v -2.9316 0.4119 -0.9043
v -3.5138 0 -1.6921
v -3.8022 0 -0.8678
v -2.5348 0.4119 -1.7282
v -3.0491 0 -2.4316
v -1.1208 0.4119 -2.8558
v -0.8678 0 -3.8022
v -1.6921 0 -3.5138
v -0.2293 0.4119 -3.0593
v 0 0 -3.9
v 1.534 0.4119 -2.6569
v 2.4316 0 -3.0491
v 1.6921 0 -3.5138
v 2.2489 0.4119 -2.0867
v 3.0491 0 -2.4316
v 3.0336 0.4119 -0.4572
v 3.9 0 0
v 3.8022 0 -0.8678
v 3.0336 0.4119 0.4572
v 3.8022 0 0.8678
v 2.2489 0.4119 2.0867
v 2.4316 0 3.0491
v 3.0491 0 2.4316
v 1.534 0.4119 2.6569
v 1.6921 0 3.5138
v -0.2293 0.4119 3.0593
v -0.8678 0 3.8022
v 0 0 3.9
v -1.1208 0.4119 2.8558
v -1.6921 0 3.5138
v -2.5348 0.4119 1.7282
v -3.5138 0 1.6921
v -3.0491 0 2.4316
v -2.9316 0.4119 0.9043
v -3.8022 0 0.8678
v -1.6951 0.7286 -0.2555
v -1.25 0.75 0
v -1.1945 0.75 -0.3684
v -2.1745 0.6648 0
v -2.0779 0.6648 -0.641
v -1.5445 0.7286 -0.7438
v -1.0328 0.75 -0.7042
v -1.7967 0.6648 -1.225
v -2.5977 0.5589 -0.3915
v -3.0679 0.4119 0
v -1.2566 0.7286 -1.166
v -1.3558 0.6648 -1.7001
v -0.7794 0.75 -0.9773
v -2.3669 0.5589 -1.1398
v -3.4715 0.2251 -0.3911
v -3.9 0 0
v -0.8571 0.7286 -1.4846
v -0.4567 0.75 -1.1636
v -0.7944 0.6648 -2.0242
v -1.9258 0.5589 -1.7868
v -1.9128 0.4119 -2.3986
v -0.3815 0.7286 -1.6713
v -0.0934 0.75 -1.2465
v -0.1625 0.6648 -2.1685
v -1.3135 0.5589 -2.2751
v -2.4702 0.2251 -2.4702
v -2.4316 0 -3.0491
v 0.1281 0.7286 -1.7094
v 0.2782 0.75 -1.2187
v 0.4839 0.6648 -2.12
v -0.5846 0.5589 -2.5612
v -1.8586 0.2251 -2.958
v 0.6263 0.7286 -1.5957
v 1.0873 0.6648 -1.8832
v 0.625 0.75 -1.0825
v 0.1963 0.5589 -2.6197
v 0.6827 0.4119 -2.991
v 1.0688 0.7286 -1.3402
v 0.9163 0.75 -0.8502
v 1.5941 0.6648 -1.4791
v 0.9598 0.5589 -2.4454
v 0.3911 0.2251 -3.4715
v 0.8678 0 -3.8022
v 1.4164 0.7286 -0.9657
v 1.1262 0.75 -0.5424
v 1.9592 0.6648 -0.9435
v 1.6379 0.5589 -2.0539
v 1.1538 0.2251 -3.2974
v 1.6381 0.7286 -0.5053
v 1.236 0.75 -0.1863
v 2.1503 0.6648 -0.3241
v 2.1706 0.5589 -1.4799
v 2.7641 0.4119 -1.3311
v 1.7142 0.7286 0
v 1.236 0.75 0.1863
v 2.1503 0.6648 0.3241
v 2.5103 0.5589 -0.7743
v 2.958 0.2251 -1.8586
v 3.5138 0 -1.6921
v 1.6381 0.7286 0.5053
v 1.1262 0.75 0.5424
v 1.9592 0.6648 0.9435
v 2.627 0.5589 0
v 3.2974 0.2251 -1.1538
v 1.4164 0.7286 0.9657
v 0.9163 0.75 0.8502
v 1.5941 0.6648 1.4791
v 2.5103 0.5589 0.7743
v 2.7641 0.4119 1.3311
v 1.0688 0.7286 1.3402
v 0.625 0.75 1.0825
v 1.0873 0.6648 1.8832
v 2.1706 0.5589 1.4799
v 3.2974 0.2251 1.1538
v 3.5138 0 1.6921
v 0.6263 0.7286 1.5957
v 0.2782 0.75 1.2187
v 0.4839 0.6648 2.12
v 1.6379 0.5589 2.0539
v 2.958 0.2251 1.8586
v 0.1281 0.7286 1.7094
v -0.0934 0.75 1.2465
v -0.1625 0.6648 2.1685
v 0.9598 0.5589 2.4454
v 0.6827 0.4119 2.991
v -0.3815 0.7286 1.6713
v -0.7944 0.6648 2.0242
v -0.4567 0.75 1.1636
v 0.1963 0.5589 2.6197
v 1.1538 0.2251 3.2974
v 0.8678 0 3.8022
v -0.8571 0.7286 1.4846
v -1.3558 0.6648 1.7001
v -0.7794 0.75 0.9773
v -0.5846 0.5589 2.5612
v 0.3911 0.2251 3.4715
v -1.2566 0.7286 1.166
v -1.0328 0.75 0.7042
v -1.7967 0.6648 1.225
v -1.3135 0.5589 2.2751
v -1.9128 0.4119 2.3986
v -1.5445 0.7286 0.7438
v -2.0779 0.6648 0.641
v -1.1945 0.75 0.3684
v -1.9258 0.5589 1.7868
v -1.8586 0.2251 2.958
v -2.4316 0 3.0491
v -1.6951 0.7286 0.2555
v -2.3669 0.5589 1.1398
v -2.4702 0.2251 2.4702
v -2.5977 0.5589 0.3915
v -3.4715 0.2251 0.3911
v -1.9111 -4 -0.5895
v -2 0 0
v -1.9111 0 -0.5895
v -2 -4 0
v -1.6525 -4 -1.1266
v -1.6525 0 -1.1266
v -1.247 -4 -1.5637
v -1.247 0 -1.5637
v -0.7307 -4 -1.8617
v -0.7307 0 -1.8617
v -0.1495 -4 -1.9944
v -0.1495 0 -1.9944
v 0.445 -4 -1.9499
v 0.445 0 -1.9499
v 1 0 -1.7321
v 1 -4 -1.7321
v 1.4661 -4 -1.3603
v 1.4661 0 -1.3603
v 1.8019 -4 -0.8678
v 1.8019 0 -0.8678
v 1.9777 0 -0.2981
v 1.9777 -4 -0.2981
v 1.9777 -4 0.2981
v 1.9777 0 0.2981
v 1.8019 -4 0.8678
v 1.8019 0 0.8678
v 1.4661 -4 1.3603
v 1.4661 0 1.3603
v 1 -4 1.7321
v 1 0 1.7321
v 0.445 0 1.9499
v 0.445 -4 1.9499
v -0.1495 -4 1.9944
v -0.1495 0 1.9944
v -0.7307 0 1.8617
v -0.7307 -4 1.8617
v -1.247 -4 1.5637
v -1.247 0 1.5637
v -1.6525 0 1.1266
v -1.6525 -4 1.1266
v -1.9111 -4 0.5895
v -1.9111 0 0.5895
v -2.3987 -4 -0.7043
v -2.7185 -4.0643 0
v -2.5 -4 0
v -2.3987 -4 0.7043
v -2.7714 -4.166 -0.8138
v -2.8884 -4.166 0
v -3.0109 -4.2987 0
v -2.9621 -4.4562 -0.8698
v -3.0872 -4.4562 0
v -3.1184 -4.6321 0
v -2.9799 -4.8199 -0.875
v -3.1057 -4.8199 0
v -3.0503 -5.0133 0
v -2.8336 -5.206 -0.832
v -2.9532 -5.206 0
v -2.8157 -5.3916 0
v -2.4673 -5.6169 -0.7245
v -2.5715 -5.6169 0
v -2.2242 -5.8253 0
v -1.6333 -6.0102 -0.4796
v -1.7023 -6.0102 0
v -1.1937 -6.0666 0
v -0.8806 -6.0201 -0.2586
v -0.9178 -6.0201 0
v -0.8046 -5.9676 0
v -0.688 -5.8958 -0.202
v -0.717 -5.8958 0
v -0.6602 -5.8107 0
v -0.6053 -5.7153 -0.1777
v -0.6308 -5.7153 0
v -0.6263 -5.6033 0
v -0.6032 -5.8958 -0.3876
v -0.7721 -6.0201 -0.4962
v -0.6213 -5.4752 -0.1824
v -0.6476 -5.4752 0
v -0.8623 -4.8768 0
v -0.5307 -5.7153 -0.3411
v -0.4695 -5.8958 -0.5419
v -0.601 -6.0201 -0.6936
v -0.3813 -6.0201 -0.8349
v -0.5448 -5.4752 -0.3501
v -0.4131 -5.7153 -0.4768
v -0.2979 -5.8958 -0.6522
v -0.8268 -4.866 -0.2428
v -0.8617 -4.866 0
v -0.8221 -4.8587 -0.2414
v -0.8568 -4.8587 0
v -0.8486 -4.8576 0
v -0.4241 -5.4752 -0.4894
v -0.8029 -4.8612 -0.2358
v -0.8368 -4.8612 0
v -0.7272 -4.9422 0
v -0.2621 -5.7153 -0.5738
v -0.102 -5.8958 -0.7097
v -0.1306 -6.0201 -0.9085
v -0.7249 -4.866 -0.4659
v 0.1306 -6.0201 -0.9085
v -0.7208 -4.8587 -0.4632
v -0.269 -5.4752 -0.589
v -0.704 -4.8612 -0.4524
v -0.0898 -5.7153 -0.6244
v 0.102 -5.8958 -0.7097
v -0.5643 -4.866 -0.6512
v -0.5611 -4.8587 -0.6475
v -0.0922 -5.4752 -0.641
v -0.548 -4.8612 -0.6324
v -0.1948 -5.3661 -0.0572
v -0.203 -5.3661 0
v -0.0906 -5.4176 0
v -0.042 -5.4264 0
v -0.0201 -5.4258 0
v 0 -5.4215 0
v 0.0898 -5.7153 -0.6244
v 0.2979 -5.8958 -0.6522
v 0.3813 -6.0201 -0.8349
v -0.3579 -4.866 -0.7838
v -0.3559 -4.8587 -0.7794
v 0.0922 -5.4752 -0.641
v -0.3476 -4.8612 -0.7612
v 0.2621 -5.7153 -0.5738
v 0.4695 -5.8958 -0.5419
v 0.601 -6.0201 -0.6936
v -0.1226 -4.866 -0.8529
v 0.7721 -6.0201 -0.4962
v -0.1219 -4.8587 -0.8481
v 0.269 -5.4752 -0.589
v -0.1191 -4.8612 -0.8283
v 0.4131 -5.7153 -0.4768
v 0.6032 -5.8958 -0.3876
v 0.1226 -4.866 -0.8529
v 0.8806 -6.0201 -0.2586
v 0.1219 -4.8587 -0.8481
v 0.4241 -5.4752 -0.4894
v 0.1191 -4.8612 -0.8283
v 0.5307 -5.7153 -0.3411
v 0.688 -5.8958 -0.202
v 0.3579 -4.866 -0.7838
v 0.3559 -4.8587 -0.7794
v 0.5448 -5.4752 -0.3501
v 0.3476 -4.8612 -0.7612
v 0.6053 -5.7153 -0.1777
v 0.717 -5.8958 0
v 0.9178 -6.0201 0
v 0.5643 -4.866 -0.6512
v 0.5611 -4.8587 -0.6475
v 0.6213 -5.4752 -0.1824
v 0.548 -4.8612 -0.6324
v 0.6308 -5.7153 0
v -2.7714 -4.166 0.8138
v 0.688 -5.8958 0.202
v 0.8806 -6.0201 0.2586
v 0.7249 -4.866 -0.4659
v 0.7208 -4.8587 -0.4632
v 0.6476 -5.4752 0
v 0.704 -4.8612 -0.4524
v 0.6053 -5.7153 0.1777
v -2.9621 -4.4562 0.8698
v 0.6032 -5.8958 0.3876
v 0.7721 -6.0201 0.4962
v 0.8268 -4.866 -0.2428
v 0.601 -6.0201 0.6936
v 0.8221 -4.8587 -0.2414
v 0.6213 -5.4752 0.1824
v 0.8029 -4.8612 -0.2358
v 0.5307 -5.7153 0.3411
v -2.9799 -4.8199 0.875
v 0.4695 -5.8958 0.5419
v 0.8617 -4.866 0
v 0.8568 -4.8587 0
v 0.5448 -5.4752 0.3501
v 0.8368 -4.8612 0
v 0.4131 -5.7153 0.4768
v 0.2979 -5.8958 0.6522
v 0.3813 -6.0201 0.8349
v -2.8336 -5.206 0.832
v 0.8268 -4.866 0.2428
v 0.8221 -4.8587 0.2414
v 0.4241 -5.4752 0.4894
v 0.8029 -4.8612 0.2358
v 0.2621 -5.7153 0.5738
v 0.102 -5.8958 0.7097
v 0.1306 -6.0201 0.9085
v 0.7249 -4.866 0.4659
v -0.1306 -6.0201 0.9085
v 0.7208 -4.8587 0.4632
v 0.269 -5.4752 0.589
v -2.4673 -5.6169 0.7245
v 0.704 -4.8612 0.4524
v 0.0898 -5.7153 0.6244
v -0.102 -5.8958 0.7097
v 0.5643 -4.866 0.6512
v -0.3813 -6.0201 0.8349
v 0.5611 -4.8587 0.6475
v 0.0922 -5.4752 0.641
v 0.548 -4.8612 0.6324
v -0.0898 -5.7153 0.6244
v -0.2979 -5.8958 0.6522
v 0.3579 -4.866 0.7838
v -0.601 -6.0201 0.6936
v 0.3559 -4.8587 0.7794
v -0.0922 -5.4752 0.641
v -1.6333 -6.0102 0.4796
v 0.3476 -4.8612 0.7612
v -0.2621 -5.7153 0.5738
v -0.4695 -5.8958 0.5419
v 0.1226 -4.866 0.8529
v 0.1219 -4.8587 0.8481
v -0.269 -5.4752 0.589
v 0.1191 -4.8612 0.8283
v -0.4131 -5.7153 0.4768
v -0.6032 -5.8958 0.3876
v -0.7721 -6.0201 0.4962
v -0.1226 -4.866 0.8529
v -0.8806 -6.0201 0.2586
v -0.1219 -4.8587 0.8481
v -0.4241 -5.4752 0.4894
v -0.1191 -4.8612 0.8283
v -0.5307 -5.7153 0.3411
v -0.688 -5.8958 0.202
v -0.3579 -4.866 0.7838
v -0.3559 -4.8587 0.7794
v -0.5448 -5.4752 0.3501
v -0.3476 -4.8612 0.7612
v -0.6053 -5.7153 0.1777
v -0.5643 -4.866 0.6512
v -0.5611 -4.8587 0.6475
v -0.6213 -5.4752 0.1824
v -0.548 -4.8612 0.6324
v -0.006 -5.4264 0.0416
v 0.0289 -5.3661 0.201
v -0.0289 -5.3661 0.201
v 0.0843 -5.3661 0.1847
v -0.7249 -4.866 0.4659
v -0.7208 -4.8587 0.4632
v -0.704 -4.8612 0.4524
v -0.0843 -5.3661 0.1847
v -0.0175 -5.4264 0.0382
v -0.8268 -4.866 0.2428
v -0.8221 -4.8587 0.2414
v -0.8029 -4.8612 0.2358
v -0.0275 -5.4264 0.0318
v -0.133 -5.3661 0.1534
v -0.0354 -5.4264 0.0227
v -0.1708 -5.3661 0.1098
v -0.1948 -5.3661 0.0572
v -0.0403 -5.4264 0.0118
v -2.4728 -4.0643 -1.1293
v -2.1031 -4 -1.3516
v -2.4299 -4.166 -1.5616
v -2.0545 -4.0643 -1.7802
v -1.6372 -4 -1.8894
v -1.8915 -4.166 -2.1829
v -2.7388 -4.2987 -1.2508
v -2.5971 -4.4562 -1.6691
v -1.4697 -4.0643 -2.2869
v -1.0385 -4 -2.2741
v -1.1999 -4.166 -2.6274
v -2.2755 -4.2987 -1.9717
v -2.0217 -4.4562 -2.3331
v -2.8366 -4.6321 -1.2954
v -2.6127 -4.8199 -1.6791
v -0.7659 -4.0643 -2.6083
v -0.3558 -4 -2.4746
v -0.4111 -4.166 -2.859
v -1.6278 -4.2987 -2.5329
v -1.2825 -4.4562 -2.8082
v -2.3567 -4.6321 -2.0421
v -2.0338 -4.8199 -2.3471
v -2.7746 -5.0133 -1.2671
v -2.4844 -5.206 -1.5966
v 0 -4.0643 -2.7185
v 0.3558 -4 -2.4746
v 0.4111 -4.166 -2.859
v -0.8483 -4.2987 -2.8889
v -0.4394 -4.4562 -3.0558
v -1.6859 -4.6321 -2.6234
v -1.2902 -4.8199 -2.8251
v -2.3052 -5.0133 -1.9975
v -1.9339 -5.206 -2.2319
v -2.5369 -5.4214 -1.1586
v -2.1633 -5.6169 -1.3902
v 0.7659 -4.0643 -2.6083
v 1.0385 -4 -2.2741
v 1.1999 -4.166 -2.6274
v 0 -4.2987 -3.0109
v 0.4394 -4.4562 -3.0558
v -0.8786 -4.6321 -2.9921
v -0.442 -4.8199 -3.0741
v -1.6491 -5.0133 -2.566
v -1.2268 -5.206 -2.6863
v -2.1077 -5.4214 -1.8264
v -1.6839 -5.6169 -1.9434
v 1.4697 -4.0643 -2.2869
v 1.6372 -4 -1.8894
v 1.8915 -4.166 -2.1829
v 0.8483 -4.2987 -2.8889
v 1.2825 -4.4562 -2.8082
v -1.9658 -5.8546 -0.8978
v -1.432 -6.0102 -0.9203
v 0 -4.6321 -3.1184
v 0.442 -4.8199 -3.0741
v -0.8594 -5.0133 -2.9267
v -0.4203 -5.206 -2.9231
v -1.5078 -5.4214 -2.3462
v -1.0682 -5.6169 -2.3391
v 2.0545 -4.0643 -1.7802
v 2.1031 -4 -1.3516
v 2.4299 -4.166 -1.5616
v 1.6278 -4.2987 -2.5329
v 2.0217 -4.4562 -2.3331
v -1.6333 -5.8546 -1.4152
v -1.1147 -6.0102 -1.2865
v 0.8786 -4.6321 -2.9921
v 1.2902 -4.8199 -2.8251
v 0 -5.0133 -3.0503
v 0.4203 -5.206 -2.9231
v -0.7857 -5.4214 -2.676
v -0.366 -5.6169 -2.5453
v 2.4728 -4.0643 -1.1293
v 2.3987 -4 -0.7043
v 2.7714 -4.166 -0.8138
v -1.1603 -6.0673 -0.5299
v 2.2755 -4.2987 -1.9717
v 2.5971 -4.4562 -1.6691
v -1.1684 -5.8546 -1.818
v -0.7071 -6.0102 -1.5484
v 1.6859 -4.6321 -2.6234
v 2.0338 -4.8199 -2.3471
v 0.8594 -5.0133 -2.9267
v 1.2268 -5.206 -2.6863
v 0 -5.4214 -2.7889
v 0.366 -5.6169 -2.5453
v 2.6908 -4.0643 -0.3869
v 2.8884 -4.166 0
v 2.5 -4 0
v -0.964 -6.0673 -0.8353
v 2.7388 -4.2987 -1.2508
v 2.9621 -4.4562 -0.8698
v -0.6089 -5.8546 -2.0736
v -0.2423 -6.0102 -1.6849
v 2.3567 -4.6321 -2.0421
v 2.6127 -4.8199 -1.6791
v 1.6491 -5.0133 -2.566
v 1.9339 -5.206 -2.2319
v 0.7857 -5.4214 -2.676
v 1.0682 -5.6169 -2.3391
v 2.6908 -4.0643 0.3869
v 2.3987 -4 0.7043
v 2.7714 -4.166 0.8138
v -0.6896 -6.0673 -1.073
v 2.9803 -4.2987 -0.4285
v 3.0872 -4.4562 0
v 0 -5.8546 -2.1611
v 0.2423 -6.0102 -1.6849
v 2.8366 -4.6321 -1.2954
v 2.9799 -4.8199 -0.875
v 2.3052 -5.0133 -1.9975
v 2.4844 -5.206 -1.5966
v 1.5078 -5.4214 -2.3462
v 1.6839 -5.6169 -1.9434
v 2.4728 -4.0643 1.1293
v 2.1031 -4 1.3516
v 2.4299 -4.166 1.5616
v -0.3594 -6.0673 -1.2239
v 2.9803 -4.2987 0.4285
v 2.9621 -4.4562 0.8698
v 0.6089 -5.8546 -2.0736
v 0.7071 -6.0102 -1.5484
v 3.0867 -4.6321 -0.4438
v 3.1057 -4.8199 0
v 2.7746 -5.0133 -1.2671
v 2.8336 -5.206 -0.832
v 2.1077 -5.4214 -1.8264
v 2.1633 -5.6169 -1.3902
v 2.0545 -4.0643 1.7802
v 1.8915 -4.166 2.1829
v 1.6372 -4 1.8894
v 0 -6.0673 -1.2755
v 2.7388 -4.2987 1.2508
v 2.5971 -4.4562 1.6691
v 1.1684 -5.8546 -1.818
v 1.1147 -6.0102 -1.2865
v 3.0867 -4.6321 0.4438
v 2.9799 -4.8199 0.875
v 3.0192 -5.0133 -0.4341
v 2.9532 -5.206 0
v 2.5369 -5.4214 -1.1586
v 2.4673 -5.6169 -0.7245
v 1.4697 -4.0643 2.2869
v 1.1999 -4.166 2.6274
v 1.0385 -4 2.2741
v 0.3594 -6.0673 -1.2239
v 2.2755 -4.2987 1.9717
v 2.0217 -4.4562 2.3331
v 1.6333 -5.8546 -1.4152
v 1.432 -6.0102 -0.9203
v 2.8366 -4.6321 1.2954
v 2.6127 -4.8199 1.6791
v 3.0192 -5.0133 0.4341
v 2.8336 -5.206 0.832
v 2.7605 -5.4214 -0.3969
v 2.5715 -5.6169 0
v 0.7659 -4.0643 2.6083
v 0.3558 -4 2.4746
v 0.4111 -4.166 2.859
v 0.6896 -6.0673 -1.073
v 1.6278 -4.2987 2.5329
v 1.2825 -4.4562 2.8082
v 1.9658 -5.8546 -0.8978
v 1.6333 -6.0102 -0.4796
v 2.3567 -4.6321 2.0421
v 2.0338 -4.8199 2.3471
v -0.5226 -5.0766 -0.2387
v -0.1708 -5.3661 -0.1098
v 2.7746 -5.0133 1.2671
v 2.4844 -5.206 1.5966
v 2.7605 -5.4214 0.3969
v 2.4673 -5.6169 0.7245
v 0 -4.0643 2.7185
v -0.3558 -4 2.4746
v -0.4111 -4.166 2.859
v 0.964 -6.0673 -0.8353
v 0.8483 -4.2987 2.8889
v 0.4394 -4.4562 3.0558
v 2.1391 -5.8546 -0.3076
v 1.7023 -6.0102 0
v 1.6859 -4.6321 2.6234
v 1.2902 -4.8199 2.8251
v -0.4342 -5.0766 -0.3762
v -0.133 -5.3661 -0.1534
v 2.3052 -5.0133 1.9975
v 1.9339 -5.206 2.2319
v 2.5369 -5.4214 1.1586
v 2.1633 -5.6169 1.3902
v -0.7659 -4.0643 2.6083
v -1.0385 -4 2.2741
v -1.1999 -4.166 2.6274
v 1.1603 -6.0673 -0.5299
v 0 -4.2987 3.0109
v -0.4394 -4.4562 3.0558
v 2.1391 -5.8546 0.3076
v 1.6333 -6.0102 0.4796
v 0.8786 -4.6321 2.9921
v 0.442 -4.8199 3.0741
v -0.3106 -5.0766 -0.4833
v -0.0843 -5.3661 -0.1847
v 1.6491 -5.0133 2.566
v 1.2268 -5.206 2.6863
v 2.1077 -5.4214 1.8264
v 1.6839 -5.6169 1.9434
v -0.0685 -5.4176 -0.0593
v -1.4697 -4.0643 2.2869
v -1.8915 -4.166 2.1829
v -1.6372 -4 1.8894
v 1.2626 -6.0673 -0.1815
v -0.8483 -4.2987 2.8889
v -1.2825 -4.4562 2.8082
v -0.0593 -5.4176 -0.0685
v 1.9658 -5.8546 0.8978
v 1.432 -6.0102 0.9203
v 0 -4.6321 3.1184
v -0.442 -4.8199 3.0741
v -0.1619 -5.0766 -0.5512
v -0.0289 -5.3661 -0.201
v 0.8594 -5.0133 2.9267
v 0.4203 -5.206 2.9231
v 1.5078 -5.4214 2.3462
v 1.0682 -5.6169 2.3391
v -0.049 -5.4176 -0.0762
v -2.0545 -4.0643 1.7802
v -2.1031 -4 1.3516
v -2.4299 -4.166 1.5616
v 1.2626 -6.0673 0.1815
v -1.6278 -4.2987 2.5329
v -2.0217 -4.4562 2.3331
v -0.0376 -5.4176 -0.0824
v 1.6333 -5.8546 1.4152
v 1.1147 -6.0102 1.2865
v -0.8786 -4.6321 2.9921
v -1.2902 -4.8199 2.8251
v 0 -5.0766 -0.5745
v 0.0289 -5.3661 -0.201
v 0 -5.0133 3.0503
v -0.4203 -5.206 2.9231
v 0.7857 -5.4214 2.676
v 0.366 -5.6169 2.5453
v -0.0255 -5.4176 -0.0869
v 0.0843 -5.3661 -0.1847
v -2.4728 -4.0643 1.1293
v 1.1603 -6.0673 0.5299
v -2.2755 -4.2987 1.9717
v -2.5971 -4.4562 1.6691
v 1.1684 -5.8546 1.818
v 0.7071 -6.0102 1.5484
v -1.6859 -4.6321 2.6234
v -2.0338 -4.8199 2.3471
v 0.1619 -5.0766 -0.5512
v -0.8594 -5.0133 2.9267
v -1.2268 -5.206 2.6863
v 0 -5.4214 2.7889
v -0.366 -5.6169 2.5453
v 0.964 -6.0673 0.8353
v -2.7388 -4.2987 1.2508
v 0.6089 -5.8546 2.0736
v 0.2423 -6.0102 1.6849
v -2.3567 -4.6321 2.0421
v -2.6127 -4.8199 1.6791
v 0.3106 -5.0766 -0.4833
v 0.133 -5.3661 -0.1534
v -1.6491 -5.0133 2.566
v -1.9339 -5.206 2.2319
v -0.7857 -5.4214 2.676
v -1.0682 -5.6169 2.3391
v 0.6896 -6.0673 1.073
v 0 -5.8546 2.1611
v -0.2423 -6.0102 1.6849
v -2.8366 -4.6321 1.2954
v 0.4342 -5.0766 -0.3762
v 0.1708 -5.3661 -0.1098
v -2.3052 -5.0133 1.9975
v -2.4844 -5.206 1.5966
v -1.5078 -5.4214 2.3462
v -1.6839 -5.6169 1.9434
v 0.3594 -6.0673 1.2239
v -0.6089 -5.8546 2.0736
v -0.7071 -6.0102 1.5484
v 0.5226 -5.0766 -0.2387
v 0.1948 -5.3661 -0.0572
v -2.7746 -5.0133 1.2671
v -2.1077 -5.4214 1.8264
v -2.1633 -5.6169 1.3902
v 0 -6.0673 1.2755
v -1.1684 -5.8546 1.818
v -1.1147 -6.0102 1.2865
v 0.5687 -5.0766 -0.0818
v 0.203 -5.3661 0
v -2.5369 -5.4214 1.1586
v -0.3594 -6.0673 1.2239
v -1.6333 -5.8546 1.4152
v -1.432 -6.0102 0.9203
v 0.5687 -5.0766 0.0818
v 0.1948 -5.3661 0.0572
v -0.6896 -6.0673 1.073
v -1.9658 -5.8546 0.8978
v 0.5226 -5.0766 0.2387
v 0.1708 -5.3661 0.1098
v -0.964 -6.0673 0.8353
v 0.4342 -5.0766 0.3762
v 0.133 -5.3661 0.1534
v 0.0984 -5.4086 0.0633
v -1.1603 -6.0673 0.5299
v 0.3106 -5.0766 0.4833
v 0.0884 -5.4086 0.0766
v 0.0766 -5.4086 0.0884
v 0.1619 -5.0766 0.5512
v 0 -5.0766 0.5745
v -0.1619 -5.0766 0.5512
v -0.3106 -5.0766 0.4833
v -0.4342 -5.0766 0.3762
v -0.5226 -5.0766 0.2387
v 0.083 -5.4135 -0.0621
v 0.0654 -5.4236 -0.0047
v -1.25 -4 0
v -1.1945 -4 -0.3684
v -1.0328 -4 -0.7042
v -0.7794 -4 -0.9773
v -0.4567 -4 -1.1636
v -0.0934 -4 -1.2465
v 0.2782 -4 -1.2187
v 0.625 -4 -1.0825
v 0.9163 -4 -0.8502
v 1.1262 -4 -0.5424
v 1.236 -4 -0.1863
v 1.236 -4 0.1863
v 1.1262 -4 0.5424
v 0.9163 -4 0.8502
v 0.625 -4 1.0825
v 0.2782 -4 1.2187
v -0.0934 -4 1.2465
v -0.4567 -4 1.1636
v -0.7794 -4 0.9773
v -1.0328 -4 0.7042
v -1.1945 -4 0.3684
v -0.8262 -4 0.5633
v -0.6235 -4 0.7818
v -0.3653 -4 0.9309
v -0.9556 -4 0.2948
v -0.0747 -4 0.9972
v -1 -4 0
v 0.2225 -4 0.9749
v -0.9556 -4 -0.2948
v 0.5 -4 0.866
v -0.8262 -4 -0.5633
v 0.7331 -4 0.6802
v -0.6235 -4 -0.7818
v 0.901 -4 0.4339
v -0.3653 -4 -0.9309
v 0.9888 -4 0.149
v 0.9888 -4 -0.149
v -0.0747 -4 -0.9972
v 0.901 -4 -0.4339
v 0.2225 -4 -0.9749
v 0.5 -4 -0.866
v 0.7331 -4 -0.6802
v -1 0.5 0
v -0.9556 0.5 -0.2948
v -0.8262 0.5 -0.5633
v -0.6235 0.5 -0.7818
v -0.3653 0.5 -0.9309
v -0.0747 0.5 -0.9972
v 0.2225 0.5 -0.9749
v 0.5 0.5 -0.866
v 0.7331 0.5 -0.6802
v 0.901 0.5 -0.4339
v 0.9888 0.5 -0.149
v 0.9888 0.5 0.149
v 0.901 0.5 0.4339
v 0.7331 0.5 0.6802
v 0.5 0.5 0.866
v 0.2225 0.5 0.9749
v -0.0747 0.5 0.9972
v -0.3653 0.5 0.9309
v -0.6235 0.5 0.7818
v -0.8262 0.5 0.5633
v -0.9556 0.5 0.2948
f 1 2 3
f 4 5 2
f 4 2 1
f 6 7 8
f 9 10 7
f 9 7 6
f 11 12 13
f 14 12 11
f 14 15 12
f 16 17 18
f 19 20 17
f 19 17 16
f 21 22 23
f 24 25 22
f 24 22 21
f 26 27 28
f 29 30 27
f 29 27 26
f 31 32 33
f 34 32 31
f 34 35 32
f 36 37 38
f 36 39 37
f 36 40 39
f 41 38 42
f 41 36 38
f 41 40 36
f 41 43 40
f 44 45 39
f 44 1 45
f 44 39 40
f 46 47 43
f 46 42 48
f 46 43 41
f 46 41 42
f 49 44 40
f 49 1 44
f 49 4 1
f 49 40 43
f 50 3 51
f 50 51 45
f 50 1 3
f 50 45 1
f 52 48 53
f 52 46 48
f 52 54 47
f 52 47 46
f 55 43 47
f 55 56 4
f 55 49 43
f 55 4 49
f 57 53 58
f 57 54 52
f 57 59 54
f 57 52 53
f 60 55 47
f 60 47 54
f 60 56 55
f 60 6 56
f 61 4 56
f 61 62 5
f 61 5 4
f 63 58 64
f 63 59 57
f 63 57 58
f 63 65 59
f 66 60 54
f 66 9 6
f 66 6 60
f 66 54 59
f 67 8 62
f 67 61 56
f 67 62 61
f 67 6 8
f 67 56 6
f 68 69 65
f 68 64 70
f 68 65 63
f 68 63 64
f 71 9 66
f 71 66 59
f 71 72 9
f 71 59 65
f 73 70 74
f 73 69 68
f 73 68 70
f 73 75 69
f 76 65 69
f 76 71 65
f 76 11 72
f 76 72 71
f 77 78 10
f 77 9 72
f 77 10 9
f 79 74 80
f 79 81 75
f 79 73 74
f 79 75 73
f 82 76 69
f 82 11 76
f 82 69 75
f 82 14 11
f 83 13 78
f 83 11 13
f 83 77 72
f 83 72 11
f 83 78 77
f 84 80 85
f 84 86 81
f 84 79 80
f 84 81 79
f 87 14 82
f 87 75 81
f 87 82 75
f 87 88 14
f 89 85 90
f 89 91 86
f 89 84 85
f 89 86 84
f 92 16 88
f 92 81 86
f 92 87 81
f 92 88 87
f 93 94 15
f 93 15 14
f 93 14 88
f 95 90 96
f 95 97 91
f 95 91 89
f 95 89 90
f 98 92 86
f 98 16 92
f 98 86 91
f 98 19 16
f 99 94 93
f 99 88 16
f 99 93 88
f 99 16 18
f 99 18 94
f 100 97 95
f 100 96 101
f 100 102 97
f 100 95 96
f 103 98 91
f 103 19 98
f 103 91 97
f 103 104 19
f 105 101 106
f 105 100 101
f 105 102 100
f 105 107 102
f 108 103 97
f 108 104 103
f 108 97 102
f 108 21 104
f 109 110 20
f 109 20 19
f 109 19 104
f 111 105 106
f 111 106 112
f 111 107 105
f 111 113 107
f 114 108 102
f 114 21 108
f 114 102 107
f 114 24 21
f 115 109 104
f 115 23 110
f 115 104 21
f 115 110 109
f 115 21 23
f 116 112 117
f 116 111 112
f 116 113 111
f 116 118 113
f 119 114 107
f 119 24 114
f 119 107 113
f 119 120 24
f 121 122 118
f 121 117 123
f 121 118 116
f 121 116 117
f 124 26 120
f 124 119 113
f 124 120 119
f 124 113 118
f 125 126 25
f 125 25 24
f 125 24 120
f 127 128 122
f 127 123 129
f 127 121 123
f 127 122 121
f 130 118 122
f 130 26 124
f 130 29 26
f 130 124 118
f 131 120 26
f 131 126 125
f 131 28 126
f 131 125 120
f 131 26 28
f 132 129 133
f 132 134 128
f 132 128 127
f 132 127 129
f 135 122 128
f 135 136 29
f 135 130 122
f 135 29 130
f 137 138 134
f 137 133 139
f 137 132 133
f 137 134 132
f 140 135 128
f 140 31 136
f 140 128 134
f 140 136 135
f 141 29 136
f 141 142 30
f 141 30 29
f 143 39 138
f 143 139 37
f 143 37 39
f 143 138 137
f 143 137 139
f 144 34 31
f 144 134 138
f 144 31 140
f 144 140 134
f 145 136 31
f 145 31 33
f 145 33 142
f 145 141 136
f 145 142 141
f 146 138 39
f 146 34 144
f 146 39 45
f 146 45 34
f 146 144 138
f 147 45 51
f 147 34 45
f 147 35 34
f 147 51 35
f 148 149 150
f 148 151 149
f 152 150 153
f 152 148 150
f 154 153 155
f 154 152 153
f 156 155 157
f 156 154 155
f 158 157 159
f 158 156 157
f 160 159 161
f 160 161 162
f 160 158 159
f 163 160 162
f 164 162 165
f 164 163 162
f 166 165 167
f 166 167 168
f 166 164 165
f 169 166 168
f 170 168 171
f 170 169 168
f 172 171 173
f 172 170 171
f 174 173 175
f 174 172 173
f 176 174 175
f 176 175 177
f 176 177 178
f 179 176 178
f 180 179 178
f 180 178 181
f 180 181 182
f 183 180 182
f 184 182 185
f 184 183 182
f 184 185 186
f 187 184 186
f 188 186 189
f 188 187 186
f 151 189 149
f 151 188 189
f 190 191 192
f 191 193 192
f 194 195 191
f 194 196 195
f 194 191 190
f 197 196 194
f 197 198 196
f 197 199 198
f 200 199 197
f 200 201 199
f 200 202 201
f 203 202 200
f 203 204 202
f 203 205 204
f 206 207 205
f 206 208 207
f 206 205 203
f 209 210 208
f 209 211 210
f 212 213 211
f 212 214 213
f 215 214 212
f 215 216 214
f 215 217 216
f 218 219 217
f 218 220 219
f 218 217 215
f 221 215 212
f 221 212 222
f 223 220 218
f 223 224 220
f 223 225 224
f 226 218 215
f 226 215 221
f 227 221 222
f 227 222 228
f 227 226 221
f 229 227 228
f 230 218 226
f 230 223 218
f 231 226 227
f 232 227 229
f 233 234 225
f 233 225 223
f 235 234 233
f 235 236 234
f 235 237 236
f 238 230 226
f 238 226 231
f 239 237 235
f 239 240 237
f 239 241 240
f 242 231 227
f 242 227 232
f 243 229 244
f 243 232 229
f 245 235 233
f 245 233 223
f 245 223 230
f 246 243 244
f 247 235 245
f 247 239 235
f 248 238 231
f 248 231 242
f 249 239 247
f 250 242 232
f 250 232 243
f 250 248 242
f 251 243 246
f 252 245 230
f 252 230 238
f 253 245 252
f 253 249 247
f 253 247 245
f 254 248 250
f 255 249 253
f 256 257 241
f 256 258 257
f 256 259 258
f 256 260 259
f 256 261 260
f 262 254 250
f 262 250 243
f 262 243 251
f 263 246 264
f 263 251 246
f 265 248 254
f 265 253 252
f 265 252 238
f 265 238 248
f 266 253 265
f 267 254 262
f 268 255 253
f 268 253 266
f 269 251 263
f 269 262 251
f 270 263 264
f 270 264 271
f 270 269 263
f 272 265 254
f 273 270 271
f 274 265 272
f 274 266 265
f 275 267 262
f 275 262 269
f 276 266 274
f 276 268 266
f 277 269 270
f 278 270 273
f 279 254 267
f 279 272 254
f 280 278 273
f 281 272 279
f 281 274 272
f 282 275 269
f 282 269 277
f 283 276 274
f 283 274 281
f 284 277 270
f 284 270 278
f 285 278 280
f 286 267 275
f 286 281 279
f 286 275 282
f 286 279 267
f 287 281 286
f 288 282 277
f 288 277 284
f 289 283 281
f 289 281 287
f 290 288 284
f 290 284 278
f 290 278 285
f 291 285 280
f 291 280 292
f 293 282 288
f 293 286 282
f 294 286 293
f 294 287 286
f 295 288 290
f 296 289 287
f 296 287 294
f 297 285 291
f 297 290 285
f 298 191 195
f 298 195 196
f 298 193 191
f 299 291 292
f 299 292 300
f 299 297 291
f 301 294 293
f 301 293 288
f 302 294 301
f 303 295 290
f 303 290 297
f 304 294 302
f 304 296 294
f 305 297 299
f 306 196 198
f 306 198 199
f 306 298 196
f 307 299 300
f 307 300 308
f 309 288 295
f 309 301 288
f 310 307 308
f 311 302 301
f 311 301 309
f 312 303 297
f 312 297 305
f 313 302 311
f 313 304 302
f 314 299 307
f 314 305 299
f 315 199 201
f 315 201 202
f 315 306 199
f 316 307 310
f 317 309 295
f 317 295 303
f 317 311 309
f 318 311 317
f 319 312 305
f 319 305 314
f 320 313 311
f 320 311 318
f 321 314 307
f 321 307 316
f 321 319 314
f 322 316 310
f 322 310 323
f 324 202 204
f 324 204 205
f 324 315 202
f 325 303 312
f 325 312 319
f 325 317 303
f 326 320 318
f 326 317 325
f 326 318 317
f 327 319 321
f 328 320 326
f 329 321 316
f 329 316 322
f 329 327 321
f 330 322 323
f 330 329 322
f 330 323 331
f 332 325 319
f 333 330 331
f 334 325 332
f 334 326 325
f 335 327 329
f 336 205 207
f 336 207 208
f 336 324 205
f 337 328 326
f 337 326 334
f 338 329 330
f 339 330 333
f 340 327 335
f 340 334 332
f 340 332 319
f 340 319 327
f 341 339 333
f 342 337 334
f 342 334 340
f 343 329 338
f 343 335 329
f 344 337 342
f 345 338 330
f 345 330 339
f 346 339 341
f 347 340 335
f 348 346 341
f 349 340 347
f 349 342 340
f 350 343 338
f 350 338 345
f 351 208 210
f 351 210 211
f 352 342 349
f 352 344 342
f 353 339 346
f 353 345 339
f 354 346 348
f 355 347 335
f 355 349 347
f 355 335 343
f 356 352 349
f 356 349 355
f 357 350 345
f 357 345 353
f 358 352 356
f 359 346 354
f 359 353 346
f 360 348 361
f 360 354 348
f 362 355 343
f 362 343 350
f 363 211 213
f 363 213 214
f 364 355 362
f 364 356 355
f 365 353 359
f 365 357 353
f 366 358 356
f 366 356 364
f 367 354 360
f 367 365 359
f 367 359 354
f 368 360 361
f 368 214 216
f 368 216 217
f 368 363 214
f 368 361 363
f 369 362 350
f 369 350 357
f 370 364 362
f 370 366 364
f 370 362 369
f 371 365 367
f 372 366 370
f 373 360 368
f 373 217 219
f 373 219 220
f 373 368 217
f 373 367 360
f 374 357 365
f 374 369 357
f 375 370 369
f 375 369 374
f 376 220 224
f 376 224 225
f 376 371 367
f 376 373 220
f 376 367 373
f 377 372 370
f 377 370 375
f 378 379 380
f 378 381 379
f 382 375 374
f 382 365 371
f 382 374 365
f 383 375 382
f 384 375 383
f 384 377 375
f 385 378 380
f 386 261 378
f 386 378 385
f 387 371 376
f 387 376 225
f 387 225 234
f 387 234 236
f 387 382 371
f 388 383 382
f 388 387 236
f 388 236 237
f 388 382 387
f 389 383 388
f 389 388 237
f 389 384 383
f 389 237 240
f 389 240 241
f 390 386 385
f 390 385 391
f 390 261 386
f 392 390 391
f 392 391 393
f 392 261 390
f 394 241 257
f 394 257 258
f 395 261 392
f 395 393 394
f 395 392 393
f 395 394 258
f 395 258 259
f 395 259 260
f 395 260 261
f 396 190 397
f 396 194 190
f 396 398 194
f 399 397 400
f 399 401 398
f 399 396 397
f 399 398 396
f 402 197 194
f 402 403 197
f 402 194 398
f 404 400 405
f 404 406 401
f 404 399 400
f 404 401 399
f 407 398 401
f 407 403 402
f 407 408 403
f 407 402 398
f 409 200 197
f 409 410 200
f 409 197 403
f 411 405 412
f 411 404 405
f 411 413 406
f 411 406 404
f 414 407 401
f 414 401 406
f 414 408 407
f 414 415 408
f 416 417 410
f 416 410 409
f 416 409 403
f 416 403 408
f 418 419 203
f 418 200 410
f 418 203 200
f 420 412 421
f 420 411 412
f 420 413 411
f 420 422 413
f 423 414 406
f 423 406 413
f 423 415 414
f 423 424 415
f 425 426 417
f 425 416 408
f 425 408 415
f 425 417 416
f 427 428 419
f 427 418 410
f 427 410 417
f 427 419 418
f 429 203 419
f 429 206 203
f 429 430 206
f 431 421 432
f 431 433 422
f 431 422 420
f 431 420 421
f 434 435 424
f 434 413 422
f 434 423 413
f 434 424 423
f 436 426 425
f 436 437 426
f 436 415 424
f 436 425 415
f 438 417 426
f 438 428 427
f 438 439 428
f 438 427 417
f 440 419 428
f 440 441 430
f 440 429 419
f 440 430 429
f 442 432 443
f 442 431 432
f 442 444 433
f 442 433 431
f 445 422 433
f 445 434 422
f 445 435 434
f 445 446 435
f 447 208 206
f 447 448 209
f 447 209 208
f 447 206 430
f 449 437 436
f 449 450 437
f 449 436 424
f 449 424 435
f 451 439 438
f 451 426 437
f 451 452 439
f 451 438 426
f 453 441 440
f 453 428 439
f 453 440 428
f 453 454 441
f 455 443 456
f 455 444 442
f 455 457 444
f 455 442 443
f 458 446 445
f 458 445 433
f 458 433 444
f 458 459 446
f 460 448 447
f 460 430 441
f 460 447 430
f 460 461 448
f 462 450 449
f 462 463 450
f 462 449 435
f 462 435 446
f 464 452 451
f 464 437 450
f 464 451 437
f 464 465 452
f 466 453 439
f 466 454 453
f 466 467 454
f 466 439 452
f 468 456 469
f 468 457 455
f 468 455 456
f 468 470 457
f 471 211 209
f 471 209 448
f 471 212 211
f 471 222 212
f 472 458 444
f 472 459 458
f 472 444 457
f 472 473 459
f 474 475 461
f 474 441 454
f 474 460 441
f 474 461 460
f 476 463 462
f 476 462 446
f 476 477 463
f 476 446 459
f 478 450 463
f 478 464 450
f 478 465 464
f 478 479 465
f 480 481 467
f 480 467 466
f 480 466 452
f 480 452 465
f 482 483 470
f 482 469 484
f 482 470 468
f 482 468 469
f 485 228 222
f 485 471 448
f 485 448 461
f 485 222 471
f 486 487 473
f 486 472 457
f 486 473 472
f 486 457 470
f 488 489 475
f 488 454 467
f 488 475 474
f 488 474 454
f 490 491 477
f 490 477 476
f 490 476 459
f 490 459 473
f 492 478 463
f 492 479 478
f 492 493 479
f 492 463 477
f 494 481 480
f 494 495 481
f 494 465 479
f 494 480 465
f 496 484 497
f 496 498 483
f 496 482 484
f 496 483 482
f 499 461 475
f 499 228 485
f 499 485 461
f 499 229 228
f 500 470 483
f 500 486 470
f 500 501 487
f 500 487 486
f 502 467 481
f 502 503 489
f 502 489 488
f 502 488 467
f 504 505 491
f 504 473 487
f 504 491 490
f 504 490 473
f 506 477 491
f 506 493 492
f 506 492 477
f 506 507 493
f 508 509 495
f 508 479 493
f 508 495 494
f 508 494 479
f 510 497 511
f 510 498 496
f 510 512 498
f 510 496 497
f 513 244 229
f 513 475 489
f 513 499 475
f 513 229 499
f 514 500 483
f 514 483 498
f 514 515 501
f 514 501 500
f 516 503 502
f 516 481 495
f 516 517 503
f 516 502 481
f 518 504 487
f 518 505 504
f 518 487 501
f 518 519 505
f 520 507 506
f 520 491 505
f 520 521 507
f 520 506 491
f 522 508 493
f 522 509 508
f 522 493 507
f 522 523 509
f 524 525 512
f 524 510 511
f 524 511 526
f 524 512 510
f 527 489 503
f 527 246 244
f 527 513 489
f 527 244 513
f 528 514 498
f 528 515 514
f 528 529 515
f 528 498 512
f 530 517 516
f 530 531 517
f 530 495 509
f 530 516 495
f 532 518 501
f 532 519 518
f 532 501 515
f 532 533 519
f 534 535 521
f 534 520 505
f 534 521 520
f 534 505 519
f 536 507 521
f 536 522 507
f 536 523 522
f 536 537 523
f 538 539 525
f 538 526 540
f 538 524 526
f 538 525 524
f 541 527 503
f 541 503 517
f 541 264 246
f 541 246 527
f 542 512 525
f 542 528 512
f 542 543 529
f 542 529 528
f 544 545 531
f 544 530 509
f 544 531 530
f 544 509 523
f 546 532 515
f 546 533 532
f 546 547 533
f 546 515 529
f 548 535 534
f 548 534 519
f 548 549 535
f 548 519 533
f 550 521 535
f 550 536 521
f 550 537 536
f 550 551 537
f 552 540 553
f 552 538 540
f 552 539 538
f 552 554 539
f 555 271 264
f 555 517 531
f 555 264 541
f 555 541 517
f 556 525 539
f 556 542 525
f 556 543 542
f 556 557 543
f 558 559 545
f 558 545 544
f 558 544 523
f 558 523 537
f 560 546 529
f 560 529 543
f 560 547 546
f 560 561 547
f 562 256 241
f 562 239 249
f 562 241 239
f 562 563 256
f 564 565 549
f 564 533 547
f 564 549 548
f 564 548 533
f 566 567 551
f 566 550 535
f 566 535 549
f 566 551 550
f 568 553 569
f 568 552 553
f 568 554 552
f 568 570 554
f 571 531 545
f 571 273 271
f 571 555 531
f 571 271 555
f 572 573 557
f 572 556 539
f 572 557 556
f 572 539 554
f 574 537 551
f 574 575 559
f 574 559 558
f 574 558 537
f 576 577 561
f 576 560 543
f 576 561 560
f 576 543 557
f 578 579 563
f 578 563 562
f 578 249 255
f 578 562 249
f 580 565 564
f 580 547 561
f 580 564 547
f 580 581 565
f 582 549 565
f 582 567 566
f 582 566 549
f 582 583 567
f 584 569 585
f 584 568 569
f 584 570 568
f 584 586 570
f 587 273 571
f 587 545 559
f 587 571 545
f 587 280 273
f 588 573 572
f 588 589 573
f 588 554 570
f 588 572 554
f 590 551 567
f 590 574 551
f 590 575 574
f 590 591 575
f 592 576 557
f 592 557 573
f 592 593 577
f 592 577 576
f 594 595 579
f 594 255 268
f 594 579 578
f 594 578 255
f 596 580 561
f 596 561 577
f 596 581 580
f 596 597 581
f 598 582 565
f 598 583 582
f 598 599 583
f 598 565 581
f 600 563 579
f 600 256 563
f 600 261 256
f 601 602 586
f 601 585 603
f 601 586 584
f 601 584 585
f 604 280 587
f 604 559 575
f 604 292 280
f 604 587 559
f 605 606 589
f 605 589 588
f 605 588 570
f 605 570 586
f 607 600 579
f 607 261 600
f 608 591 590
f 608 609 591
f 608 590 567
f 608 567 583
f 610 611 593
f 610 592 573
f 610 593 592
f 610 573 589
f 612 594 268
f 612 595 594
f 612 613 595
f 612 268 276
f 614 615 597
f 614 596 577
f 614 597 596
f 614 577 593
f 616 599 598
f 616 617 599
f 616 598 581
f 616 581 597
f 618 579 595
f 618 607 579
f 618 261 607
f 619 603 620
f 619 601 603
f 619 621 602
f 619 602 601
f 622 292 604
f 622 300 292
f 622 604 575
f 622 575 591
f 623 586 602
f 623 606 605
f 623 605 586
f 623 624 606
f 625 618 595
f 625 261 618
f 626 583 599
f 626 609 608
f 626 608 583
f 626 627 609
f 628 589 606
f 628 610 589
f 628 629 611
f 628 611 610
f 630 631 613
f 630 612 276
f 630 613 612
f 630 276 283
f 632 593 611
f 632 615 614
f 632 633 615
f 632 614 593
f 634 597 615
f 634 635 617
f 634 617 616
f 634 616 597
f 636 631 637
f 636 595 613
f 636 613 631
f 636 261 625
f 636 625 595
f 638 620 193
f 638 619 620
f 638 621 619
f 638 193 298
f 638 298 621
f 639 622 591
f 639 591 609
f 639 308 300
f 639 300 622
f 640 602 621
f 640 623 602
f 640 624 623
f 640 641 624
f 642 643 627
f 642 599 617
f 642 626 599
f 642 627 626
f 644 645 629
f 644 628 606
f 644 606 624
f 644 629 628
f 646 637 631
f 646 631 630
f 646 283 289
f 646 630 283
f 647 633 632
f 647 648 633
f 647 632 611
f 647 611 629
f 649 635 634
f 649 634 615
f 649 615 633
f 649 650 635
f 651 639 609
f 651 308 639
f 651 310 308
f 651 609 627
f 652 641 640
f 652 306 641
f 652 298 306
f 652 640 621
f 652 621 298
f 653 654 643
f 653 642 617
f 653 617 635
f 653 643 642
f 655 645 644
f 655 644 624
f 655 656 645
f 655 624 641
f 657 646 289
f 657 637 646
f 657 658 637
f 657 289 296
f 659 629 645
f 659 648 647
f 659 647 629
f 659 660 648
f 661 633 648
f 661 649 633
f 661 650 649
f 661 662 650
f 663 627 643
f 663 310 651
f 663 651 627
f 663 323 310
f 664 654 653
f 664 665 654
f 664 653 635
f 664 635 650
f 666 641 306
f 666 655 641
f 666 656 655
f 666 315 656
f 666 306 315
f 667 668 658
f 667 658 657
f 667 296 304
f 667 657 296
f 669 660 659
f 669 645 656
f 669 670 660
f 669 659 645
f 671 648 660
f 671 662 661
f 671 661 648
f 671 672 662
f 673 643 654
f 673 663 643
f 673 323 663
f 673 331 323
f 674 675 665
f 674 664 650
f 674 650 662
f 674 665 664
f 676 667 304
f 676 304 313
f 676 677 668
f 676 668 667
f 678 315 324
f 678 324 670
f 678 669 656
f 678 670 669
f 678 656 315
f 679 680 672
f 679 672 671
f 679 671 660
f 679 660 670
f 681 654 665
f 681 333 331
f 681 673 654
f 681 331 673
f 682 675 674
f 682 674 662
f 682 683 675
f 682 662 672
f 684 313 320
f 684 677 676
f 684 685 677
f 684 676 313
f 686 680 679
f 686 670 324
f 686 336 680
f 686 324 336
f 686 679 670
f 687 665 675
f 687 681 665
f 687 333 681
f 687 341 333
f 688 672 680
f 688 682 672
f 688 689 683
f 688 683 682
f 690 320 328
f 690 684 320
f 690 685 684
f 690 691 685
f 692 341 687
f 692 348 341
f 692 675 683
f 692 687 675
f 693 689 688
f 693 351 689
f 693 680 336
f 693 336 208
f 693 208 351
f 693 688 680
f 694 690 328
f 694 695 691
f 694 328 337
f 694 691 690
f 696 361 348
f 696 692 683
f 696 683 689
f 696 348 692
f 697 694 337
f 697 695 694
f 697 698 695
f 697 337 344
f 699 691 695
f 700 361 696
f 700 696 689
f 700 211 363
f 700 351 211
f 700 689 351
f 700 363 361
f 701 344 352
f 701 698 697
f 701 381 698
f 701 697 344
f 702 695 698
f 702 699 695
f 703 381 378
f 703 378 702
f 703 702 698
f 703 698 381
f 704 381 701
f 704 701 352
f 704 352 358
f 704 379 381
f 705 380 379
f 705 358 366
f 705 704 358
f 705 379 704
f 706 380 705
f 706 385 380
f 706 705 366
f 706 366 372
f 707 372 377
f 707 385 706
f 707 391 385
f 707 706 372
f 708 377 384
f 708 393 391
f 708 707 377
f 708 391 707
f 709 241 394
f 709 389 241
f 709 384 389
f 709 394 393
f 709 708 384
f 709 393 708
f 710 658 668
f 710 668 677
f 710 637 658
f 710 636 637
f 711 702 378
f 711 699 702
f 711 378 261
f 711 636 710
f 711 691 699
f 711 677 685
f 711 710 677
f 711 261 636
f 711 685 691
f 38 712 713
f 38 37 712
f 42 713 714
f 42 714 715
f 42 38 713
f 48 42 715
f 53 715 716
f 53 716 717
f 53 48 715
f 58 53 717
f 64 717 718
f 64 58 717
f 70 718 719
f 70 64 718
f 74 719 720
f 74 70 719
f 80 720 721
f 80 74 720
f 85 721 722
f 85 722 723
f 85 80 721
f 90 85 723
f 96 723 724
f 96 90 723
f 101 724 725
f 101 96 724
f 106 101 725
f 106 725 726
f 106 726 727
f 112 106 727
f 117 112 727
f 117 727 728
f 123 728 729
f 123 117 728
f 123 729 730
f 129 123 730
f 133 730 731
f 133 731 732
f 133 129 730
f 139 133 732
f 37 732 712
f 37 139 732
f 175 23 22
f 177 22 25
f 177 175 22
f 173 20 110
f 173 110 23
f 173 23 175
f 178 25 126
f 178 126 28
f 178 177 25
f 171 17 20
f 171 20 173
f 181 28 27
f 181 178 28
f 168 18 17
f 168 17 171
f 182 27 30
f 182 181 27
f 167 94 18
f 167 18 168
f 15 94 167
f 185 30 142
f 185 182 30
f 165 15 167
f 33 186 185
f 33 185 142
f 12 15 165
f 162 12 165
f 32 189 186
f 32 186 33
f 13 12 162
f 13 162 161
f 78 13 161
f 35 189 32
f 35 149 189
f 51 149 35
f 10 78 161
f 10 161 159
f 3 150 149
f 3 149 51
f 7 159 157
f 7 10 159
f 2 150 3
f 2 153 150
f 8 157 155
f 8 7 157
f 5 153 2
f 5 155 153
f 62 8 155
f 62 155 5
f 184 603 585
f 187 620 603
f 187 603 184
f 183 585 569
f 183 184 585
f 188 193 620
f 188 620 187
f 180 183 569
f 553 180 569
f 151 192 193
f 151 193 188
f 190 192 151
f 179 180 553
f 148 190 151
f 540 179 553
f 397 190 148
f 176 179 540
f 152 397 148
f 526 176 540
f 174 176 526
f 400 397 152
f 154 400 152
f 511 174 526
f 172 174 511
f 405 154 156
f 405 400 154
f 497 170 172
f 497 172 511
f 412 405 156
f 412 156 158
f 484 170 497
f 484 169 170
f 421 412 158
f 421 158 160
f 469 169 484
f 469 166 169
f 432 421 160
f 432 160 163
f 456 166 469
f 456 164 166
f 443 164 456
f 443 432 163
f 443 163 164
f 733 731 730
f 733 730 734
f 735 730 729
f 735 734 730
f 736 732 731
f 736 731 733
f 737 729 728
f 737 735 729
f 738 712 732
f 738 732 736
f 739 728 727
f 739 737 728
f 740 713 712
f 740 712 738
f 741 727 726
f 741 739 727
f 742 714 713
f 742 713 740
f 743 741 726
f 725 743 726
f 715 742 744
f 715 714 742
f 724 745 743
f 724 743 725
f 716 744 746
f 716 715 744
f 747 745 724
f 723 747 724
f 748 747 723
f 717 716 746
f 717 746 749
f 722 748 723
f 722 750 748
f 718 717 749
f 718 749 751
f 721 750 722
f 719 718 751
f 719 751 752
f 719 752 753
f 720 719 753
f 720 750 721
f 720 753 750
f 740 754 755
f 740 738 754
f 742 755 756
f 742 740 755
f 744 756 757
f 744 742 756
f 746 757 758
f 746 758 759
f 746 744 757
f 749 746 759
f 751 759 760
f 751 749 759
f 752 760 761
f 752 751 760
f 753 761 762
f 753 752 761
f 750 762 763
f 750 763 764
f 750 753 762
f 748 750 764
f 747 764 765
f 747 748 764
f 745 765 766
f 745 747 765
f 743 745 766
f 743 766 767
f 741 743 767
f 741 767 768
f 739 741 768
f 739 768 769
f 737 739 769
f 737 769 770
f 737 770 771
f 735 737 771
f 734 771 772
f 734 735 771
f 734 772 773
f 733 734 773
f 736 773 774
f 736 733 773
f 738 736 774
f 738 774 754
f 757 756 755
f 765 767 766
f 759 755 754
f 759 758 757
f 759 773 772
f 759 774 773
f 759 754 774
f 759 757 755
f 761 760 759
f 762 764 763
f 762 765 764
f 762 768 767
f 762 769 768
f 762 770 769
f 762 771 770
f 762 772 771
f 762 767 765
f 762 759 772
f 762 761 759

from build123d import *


with BuildPart() as part:
    # Szkic1 → Obrót1 (revolve)
    with BuildSketch(Plane.XY):
        with BuildLine():
            Line((-3.9, 0), (-2, 0))
            Line((-2, 0), (-2, -4))
            Line((-2, -4), (-2.5, -4))
            add(Edge.make_bspline(
                [(-2.5, -4), (-3.327610974, -4.147752927), (-3.254907827, -5.965433101), (-0.030071268, -6.376789975), (-1.228998971, -4.324995631), (-0.216890965, -5.491229408), (0, -5.421523045)],
                knots=[0, 0, 0, 0, 0.343812162, 0.687238794, 0.81979877, 1, 1, 1, 1], degree=3))
            Line((0, -5.421523045), (0, 0.5))
            Line((0, 0.5), (-1, 0.5))
            Line((-1, 0.5), (-1, -4))
            Line((-1, -4), (-1.25, -4))
            Line((-1.25, -4), (-1.25, 0.75))
            ThreePointArc((-1.25, 0.75), (-2.627043935, 0.558888572), (-3.9, 0))
        make_face()
    revolve(axis=Axis((0, 0.5, 0), (0, -1, 0)))


solid = part.part
